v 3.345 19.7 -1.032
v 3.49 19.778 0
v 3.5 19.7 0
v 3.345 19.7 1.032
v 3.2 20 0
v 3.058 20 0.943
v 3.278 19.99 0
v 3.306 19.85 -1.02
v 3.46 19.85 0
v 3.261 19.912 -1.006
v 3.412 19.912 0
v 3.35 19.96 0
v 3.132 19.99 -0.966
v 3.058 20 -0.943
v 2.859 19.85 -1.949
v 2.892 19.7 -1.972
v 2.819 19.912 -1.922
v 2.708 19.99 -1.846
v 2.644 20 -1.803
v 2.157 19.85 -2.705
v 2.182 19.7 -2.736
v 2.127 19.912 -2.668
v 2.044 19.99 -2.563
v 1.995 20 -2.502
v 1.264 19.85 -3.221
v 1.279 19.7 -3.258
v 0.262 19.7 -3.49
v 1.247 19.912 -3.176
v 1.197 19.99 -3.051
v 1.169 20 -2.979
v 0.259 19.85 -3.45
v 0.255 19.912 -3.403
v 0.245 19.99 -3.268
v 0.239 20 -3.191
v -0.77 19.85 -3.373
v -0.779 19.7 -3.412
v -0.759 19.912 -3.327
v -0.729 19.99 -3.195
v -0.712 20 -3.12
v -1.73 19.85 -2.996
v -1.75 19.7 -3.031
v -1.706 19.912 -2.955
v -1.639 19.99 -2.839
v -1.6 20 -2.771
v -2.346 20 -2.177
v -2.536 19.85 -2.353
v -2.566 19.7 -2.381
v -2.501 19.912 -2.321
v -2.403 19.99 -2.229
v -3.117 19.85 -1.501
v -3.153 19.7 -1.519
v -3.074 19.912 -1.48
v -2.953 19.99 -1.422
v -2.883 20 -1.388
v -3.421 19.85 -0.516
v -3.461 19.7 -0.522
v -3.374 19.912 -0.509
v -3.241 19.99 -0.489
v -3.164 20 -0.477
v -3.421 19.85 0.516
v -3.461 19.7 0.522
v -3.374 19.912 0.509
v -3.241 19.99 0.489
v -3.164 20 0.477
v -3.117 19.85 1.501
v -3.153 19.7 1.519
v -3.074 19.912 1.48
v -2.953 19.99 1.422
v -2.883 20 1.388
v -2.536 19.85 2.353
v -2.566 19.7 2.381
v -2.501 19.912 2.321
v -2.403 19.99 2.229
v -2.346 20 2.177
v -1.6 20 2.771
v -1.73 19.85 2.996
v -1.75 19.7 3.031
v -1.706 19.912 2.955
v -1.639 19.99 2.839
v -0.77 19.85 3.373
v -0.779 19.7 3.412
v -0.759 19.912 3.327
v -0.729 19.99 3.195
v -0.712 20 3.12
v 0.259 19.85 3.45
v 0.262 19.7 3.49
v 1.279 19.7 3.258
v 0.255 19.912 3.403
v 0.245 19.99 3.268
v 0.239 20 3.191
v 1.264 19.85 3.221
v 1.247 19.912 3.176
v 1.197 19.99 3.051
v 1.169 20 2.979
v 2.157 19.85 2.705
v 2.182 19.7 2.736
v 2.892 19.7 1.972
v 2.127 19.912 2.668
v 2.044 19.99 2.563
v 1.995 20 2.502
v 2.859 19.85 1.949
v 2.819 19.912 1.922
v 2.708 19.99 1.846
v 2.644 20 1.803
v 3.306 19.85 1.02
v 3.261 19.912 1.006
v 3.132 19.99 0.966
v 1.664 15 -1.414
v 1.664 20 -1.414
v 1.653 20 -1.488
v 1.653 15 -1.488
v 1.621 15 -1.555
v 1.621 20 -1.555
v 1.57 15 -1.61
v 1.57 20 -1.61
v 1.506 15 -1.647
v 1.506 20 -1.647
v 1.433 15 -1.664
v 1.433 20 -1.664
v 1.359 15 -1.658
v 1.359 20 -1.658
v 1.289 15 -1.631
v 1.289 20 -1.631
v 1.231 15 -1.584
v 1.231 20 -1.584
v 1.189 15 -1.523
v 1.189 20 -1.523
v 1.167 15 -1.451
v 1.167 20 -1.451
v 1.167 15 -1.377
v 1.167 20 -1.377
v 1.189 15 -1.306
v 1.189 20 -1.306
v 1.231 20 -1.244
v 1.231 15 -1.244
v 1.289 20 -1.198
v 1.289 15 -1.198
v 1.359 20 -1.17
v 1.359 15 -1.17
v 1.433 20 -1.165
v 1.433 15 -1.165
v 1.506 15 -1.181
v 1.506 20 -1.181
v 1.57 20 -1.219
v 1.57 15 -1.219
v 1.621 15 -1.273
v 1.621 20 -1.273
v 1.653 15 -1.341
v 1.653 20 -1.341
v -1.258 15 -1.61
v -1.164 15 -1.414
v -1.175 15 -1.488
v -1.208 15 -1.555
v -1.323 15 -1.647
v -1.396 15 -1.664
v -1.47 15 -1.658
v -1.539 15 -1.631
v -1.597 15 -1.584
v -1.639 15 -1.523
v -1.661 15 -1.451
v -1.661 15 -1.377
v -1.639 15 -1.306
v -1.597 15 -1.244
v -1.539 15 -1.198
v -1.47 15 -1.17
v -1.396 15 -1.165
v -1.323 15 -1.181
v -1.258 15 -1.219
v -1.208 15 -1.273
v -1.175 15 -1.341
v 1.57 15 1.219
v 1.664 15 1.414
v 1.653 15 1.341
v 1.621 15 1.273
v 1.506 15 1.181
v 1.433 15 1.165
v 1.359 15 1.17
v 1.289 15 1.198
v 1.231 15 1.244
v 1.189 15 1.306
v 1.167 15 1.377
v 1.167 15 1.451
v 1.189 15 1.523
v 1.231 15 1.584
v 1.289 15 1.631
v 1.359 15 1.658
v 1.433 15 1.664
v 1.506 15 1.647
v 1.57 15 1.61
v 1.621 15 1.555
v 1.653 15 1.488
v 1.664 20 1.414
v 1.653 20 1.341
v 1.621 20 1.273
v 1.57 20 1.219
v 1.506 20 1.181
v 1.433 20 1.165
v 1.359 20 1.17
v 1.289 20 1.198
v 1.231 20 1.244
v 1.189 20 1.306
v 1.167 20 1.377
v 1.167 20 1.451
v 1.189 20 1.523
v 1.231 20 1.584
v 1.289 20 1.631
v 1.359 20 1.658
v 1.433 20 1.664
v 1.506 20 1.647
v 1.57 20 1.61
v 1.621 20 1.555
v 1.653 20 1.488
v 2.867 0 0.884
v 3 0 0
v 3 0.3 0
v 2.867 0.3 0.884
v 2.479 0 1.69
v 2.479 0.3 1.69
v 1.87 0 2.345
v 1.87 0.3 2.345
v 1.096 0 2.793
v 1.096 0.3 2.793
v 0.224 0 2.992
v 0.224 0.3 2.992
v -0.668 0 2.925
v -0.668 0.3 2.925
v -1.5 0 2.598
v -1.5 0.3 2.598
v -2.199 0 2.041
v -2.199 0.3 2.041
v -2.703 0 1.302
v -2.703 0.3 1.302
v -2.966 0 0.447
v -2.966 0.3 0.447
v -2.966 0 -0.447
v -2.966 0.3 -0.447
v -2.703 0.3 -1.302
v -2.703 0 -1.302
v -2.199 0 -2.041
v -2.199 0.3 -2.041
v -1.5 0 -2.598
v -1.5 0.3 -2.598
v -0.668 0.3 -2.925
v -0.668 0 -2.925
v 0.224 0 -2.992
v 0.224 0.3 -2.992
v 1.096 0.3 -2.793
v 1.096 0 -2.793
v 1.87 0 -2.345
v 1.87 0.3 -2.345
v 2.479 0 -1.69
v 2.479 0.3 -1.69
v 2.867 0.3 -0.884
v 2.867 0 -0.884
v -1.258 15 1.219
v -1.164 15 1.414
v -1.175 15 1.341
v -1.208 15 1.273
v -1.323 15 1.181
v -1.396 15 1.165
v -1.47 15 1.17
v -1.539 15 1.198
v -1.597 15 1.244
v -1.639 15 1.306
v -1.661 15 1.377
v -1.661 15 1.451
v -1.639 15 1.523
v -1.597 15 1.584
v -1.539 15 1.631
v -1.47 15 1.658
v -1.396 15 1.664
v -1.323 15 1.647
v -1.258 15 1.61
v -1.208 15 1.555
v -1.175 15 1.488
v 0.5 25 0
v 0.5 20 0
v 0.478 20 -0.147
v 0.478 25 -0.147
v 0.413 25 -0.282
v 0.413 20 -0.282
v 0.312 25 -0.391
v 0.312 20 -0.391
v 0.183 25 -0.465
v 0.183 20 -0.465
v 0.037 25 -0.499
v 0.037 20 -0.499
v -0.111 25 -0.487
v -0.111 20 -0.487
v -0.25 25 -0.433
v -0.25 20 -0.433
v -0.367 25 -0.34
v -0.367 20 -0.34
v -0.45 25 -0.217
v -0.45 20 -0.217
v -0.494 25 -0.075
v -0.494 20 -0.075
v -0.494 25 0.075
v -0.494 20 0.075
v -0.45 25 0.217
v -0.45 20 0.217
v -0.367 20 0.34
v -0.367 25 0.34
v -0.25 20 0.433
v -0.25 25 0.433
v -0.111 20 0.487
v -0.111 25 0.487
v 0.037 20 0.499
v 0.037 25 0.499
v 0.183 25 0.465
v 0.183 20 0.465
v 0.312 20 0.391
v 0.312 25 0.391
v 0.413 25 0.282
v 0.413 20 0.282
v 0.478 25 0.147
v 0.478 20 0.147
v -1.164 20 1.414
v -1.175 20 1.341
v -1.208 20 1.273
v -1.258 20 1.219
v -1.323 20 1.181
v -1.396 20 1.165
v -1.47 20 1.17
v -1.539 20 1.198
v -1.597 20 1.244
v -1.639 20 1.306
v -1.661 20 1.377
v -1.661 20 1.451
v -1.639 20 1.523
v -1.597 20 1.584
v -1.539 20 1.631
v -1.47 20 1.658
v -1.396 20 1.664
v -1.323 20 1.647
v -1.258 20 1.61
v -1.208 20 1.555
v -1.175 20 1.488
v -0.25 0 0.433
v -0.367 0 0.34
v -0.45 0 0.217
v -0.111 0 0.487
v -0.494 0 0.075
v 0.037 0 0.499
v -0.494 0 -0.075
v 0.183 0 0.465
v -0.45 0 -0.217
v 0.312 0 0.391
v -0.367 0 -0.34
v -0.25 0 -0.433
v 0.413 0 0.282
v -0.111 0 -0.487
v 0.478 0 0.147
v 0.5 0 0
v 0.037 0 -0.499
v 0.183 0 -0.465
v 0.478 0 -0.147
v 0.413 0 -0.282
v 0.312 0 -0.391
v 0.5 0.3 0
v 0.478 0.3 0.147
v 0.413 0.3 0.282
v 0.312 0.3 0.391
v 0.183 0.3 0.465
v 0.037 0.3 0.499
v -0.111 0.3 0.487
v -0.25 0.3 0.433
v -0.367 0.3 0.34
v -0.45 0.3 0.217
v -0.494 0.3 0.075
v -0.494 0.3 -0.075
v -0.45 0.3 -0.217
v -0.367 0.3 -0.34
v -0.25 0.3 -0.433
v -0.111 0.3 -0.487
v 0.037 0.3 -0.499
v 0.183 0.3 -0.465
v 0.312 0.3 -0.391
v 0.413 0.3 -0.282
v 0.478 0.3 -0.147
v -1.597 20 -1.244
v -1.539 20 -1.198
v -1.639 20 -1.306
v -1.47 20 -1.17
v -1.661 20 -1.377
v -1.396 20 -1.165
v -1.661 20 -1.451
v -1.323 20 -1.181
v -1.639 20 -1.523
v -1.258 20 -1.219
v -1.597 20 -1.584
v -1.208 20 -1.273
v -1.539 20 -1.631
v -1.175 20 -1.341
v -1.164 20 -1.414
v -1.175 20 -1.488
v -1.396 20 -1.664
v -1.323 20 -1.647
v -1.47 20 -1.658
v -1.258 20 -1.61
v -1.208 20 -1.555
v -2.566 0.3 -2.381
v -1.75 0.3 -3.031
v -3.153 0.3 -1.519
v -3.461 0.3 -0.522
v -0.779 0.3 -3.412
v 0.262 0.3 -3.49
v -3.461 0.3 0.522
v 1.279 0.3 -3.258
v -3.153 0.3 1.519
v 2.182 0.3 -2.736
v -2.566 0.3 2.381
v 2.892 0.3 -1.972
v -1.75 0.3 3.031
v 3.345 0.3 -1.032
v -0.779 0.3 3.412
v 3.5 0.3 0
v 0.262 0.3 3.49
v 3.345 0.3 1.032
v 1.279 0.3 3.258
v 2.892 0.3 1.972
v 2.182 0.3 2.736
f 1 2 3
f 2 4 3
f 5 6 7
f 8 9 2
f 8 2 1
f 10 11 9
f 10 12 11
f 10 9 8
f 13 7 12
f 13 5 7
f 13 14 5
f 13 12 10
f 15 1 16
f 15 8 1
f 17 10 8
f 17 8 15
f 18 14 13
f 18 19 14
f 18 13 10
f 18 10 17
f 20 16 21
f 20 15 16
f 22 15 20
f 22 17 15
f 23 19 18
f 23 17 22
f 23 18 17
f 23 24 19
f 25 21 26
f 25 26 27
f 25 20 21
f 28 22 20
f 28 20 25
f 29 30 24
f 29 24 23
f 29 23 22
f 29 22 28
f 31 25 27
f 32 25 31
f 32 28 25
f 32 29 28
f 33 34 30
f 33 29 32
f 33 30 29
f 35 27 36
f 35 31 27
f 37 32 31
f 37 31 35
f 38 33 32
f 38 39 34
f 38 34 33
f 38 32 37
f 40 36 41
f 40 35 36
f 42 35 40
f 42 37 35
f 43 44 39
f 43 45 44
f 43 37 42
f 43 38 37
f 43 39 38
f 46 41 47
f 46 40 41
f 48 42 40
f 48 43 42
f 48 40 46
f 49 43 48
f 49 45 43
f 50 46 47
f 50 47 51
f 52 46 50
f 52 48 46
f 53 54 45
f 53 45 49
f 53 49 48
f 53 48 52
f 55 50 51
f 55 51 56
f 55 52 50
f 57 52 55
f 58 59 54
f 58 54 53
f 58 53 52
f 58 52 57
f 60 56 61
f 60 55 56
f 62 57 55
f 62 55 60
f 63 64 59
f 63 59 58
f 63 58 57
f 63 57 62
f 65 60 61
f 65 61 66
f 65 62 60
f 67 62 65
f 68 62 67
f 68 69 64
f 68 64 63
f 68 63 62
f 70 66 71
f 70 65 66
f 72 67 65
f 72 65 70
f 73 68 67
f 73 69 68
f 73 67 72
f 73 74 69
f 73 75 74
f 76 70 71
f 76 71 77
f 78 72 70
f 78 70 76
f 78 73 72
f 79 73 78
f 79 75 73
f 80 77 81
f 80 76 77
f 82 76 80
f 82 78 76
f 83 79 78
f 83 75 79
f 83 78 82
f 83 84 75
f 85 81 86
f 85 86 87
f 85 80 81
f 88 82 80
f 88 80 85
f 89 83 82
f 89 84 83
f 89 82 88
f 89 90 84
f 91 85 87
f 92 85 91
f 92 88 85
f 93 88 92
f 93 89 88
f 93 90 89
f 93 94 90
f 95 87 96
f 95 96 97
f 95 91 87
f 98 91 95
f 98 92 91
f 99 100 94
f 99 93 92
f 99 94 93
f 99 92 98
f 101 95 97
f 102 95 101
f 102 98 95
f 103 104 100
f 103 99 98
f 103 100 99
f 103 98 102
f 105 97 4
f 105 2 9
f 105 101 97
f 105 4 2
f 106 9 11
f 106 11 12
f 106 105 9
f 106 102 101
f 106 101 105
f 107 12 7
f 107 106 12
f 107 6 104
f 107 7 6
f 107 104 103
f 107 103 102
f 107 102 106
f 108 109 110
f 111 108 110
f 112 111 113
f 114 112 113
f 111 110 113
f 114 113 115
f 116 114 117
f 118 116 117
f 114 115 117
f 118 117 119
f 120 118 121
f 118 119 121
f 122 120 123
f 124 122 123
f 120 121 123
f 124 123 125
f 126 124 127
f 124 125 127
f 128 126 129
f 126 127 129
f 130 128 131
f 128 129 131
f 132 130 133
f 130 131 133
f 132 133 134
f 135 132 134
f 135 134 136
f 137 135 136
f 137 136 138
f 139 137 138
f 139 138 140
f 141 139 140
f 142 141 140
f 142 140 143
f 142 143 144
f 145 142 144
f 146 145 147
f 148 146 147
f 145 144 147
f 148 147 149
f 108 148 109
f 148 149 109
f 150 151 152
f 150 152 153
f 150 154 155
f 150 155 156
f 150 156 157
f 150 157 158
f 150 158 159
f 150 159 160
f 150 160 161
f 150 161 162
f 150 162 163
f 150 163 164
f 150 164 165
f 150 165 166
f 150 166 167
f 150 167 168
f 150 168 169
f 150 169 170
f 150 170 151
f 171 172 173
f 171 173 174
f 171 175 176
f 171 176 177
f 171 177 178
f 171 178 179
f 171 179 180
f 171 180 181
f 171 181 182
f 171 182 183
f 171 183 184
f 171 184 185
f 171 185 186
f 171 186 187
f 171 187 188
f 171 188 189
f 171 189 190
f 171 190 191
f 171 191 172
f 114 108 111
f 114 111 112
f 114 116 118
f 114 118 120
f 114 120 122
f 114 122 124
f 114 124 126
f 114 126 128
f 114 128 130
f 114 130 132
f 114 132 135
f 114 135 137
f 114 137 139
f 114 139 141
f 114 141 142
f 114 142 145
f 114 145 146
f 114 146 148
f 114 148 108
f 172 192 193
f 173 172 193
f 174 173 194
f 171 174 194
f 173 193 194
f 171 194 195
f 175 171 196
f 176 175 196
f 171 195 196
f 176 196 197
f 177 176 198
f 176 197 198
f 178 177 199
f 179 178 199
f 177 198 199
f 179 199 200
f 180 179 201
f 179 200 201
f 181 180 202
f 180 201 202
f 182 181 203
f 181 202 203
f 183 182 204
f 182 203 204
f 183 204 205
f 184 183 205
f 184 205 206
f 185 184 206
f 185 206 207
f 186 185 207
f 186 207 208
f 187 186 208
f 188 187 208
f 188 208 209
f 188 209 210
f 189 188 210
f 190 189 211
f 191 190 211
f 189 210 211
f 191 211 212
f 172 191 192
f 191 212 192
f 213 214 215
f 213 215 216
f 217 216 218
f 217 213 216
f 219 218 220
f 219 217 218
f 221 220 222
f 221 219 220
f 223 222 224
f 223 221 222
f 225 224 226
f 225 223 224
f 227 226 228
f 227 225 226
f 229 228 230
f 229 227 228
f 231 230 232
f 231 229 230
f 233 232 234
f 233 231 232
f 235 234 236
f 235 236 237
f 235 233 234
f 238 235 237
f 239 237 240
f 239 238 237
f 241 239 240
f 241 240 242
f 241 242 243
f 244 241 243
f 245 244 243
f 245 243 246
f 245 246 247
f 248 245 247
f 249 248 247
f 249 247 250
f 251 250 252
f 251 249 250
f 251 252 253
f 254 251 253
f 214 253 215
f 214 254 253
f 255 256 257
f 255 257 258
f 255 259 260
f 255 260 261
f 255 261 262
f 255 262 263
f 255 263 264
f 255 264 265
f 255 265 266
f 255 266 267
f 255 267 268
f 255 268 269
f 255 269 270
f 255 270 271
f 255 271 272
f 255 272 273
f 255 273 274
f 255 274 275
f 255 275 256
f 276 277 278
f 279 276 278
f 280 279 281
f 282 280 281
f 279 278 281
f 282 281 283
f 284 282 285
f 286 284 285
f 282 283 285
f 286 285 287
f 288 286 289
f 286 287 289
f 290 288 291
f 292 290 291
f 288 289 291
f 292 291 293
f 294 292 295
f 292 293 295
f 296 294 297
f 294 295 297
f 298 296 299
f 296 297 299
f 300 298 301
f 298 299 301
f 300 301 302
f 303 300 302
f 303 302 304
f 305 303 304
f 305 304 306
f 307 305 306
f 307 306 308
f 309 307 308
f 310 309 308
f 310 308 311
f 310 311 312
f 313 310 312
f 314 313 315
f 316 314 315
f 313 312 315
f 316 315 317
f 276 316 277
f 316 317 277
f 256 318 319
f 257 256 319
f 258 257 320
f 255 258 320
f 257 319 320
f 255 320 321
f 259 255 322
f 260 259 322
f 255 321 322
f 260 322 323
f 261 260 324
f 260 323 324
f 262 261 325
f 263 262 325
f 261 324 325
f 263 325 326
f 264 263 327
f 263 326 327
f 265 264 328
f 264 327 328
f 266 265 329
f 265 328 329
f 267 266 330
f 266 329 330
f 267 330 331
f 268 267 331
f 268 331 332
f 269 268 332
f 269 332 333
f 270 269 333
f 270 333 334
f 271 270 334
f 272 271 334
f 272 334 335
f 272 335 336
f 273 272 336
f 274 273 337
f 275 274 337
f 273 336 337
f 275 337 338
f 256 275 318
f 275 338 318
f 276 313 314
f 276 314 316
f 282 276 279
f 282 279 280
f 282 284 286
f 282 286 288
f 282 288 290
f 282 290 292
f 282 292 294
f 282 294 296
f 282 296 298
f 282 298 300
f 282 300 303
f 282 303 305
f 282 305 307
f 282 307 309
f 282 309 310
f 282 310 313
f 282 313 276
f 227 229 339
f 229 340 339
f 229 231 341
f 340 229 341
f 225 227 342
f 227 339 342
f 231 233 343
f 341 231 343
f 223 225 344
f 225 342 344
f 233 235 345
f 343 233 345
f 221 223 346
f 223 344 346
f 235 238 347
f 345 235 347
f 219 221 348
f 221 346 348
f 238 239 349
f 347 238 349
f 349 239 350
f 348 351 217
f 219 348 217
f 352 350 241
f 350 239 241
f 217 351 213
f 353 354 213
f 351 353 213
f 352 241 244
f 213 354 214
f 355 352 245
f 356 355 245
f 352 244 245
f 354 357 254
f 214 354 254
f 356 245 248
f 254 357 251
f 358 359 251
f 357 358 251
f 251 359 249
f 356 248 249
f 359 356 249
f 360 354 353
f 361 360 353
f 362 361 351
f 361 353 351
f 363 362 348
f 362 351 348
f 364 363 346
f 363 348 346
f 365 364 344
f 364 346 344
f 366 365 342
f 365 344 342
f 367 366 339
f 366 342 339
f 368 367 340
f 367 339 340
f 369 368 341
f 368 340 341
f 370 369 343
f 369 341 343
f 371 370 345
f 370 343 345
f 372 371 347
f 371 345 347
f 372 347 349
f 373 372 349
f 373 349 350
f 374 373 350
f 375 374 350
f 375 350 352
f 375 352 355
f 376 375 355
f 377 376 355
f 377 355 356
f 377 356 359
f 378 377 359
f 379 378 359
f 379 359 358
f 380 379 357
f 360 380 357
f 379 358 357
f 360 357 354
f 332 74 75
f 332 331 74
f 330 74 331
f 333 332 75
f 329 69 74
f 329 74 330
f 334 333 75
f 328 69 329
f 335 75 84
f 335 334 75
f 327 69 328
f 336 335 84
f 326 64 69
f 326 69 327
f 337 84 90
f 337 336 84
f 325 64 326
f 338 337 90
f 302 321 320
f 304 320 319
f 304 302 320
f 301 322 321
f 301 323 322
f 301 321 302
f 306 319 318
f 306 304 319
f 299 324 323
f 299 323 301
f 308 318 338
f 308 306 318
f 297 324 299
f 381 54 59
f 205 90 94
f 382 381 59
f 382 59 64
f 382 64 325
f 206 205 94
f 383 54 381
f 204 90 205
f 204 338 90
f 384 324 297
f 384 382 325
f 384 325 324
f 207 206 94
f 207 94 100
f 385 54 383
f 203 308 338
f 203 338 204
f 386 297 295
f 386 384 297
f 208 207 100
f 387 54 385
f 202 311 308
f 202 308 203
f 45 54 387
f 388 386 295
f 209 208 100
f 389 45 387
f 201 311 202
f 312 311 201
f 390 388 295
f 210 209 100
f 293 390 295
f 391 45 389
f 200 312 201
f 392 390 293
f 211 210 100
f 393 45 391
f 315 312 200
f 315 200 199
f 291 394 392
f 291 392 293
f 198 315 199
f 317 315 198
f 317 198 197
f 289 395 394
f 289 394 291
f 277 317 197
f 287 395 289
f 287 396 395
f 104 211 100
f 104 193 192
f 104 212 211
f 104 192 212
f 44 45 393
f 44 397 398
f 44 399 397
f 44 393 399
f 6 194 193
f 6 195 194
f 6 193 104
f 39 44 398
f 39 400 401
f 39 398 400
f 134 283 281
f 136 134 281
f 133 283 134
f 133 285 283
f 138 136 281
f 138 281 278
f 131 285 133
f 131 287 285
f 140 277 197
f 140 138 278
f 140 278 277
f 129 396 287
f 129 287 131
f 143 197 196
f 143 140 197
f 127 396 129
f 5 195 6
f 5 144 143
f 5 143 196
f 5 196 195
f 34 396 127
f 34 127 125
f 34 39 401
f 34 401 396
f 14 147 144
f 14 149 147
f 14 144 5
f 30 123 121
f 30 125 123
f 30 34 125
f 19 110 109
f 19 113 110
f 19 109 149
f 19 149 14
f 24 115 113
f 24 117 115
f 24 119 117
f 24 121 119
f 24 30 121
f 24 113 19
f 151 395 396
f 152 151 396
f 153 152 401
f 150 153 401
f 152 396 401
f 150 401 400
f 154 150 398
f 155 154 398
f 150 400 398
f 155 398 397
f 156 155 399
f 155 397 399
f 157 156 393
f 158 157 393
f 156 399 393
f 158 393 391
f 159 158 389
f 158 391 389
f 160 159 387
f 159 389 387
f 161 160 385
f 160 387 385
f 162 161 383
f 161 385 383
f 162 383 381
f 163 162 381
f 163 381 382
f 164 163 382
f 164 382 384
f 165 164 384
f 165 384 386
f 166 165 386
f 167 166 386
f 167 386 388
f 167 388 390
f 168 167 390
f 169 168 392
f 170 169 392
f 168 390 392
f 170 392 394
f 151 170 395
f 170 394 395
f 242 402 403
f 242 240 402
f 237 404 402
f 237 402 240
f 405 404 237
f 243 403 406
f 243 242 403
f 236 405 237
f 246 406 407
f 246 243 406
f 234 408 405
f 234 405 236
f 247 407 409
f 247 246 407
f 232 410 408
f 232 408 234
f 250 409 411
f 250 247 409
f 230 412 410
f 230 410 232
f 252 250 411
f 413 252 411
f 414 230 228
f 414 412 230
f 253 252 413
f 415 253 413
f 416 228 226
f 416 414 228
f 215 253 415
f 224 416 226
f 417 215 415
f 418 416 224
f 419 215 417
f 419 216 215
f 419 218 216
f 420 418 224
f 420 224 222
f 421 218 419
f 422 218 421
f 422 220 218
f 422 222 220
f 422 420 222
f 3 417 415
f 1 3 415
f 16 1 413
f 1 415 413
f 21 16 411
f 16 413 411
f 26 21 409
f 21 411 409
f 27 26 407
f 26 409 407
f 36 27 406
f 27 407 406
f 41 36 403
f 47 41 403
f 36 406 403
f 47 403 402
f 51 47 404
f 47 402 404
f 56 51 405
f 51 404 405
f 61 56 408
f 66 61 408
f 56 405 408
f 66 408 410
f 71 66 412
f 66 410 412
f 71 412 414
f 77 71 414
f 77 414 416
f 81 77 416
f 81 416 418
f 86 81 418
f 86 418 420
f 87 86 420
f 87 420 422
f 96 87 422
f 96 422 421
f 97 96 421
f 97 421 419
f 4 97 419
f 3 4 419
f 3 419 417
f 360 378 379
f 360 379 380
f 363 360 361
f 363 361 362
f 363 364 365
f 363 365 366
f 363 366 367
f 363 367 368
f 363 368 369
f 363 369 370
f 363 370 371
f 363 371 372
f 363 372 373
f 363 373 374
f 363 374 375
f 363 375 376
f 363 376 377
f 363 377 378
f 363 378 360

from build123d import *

# Parameters (mm, degrees)
SKETCH_1_R          = 3.5
EXTRUDE_1_DEPTH     = 20
SKETCH_2_R          = 0.5
EXTRUDE_2_DEPTH     = 5
FILLET_1_R          = 0.3
SKETCH_3_R          = 0.25
CUT_EXTRUDE_1_DEPTH = 5
SKETCH_4_OUTSIDE_W  = 14.378
SKETCH_4_OUTSIDE_H  = 14.378
SKETCH_4_OUTSIDE_R  = 3
CUT_EXTRUDE_2_DEPTH = 0.3
SKETCH_5_R          = 0.5
CUT_EXTRUDE_3_DEPTH = 0.3


with BuildPart() as part:
    # 草图1 → 凸台-拉伸1 (new body)
    with BuildSketch(Plane(origin=(0, 0, 0), x_dir=(1, 0, 0), z_dir=(0, 1, 0))):
        Circle(SKETCH_1_R)
    extrude(amount=EXTRUDE_1_DEPTH)

    # 草图2 → 凸台-拉伸2 (add)
    with BuildSketch(Plane(origin=(0, 20, 0), x_dir=(1, 0, 0), z_dir=(0, 1, 0))):
        Circle(SKETCH_2_R)
    extrude(amount=EXTRUDE_2_DEPTH)

    # 圆角1
    fillet_1_edges = [part.edges().sort_by_distance(p)[0] for p in [
        (-3.5, 20, 0),
    ]]
    fillet(fillet_1_edges, radius=FILLET_1_R)

    # 草图3 → 切除-拉伸1 (cut)
    with BuildSketch(Plane(origin=(0, 20, 0), x_dir=(1, 0, 0), z_dir=(0, 1, 0))):
        with Locations((-1.414213562, 1.414213562)):
            Circle(SKETCH_3_R)
        with Locations((1.414213562, 1.414213562)):
            Circle(SKETCH_3_R)
        with Locations((1.414213562, -1.414213562)):
            Circle(SKETCH_3_R)
        with Locations((-1.414213562, -1.414213562)):
            Circle(SKETCH_3_R)
    extrude(amount=-CUT_EXTRUDE_1_DEPTH, mode=Mode.SUBTRACT)

    # 草图4 outside → 切除-拉伸2 (cut)
    with BuildSketch(Plane.XZ):
        Rectangle(SKETCH_4_OUTSIDE_W, SKETCH_4_OUTSIDE_H)
        Circle(SKETCH_4_OUTSIDE_R, mode=Mode.SUBTRACT)
    extrude(amount=-CUT_EXTRUDE_2_DEPTH, mode=Mode.SUBTRACT)

    # 草图5 → 切除-拉伸3 (cut)
    with BuildSketch(Plane.XZ):
        Circle(SKETCH_5_R)
    extrude(amount=-CUT_EXTRUDE_3_DEPTH, mode=Mode.SUBTRACT)


solid = part.part
